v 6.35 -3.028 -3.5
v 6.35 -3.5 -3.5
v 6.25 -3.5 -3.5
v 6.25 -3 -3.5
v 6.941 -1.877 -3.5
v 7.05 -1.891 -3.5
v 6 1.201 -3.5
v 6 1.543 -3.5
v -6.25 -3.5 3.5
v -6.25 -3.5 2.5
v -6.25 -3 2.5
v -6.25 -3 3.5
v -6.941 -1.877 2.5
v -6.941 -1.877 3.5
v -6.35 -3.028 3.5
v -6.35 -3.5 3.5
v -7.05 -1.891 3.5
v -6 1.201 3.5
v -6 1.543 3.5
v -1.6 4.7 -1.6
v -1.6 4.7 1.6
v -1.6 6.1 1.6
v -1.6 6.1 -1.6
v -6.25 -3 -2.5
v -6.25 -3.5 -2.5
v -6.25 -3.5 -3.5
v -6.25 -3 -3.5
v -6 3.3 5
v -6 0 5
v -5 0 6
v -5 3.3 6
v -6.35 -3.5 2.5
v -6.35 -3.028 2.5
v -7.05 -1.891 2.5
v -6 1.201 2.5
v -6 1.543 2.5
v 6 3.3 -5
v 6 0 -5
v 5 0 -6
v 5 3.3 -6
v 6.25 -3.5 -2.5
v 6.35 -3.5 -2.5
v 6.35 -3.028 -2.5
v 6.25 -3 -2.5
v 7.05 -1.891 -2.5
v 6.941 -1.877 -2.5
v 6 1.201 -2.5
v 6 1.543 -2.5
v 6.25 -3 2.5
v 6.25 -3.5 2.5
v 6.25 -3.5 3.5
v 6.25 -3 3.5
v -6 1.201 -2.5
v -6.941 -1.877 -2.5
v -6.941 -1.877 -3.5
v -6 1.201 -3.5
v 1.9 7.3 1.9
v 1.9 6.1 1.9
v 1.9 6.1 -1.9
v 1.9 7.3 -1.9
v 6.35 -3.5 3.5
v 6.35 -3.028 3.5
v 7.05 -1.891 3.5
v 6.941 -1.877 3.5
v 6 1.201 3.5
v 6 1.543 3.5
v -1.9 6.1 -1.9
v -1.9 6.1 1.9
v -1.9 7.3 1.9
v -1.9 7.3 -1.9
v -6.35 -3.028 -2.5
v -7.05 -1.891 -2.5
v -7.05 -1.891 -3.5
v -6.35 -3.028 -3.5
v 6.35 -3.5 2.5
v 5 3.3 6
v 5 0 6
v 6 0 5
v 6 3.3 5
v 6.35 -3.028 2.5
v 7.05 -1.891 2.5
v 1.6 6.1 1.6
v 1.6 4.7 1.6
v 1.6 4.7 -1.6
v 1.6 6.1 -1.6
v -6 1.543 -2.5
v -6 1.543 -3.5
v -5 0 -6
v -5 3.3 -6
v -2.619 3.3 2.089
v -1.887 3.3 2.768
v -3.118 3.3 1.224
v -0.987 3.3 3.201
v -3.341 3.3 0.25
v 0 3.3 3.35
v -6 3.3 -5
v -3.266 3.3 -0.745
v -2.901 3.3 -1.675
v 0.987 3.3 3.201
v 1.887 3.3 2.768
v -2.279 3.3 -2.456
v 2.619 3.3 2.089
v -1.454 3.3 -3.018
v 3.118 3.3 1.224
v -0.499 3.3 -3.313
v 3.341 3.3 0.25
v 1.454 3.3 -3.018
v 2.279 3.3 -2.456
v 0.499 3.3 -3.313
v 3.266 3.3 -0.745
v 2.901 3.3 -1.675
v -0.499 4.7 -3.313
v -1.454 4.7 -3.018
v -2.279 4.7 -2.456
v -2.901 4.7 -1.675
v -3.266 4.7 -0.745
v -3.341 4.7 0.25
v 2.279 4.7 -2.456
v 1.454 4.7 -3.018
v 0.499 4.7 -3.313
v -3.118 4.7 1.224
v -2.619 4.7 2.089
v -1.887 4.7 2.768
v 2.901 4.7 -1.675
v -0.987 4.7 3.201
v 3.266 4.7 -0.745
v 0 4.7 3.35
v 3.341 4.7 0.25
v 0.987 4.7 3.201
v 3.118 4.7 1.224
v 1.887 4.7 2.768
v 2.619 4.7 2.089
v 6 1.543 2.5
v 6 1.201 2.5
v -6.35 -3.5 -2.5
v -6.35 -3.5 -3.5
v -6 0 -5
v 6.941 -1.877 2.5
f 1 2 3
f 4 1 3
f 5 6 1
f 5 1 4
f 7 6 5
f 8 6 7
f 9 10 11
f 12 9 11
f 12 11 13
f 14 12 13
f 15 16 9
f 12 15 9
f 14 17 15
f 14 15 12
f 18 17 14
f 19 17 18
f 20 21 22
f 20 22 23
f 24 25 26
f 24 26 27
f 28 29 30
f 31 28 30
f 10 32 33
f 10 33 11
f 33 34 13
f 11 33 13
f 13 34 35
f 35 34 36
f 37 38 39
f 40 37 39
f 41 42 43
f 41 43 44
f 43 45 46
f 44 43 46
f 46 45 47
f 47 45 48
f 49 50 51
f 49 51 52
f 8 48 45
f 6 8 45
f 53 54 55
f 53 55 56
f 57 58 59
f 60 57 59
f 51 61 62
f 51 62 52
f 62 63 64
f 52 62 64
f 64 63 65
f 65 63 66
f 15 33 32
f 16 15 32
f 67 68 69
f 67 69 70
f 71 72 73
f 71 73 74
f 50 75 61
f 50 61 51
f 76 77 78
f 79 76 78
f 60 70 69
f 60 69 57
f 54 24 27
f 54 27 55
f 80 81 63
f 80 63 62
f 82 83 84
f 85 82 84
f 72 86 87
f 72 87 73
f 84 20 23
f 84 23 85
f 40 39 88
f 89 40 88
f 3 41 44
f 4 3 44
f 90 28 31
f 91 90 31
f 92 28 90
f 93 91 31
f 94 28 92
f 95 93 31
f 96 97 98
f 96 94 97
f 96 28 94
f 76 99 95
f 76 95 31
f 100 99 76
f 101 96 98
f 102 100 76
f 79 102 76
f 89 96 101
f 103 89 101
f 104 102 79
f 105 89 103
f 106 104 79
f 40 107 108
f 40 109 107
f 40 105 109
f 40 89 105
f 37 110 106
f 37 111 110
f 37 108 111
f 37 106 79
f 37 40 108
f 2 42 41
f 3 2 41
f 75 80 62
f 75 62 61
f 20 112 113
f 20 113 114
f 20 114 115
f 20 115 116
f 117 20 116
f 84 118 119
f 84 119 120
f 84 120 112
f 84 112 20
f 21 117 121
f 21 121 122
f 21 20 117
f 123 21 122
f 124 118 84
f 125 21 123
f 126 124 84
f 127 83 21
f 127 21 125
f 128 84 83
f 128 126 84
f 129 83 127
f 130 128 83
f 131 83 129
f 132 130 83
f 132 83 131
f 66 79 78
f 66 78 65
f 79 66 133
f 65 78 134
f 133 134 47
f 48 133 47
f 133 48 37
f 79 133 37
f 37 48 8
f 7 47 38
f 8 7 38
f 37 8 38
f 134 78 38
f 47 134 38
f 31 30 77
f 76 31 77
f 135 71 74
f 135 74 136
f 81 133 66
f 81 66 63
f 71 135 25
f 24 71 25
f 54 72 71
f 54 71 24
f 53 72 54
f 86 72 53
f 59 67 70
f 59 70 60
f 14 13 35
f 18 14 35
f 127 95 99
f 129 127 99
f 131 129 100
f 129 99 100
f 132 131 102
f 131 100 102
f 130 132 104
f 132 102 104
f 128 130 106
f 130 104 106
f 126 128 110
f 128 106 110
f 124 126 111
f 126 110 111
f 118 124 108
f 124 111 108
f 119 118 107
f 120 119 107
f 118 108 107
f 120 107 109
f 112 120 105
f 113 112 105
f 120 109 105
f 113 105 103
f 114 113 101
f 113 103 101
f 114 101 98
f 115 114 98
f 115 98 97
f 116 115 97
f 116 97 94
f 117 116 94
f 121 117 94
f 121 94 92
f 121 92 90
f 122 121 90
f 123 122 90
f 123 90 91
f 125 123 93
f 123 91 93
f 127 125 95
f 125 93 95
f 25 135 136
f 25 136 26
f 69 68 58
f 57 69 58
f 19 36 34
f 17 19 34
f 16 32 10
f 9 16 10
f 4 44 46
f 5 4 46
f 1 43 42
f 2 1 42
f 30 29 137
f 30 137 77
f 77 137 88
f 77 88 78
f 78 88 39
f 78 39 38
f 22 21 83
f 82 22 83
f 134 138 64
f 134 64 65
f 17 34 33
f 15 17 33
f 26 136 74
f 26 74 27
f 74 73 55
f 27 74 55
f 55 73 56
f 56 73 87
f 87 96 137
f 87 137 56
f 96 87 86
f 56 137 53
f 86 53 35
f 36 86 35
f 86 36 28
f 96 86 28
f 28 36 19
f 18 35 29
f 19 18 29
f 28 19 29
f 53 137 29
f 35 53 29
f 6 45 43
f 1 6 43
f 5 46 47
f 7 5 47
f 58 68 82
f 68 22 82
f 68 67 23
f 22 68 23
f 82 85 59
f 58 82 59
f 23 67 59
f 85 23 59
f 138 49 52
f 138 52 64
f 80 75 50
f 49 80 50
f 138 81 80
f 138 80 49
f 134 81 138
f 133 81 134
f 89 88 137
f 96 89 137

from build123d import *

# Parameters (mm, degrees)
BOSS_EXTRUDE1_DEPTH = 3.3
BOSS_EXTRUDE2_START = 3.3
SKETCH3_R           = 3.35
BOSS_EXTRUDE2_DEPTH = 1.4
BOSS_EXTRUDE3_START = 4.7
SKETCH3_3_W         = 3.2
SKETCH3_3_H         = 3.2
BOSS_EXTRUDE3_DEPTH = 1.4
BOSS_EXTRUDE4_START = 6.1
SKETCH3_4_W         = 3.8
SKETCH3_4_H         = 3.8
BOSS_EXTRUDE4_DEPTH = 1.2
BOSS_EXTRUDE5_START = 2.5
BOSS_EXTRUDE5_DEPTH = 1
BOSS_EXTRUDE6_START = -2.5
BOSS_EXTRUDE6_DEPTH = 1


with BuildPart() as part:
    # Sketch1 → Boss-Extrude1 (new body)
    with BuildSketch(Plane(origin=(0, 0, 0), x_dir=(1, 0, 0), z_dir=(0, 1, 0))):
        Polygon((-5, 6), (-6, 5), (-6, -5), (-5, -6), (5, -6), (6, -5), (6, 5), (5, 6), align=None)
    extrude(amount=BOSS_EXTRUDE1_DEPTH)

    # Sketch3 → Boss-Extrude2 (add)
    with BuildSketch(Plane(origin=(0, 0, 0), x_dir=(1, 0, 0), z_dir=(0, 1, 0)).offset(BOSS_EXTRUDE2_START)):
        with Locations(Location((0, 0, 0), (0, 0, 270))):
            Circle(SKETCH3_R)
    extrude(amount=BOSS_EXTRUDE2_DEPTH)

    # Sketch3<3> → Boss-Extrude3 (add)
    with BuildSketch(Plane(origin=(0, 0, 0), x_dir=(1, 0, 0), z_dir=(0, 1, 0)).offset(BOSS_EXTRUDE3_START)):
        Rectangle(SKETCH3_3_W, SKETCH3_3_H)
    extrude(amount=BOSS_EXTRUDE3_DEPTH)

    # Sketch3<4> → Boss-Extrude4 (add)
    with BuildSketch(Plane(origin=(0, 0, 0), x_dir=(1, 0, 0), z_dir=(0, 1, 0)).offset(BOSS_EXTRUDE4_START)):
        Rectangle(SKETCH3_4_W, SKETCH3_4_H)
    extrude(amount=BOSS_EXTRUDE4_DEPTH)

    # Sketch4 → Boss-Extrude5 (add)
    with BuildSketch(Plane.XY.offset(BOSS_EXTRUDE5_START)):
        Polygon((6, 1.543469882), (7.05, -1.890925367), (6.35, -3.028306733), (6.35, -3.5), (6.25, -3.5), (6.25, -3), (6.941165312, -1.876973505), (6, 1.20143952), align=None)
        Polygon((-6.941165312, -1.876973505), (-6, 1.20143952), (-6, 1.543469882), (-7.05, -1.890925367), (-6.35, -3.028306733), (-6.35, -3.5), (-6.25, -3.5), (-6.25, -3), align=None)
    extrude(amount=BOSS_EXTRUDE5_DEPTH)

    # Sketch4<2> → Boss-Extrude6 (add)
    with BuildSketch(Plane.XY.offset(BOSS_EXTRUDE6_START)):
        Polygon((6, 1.543469882), (7.05, -1.890925367), (6.35, -3.028306733), (6.35, -3.5), (6.25, -3.5), (6.25, -3), (6.941165312, -1.876973505), (6, 1.20143952), align=None)
        Polygon((-6.941165312, -1.876973505), (-6, 1.20143952), (-6, 1.543469882), (-7.05, -1.890925367), (-6.35, -3.028306733), (-6.35, -3.5), (-6.25, -3.5), (-6.25, -3), align=None)
    extrude(amount=-BOSS_EXTRUDE6_DEPTH)


solid = part.part
